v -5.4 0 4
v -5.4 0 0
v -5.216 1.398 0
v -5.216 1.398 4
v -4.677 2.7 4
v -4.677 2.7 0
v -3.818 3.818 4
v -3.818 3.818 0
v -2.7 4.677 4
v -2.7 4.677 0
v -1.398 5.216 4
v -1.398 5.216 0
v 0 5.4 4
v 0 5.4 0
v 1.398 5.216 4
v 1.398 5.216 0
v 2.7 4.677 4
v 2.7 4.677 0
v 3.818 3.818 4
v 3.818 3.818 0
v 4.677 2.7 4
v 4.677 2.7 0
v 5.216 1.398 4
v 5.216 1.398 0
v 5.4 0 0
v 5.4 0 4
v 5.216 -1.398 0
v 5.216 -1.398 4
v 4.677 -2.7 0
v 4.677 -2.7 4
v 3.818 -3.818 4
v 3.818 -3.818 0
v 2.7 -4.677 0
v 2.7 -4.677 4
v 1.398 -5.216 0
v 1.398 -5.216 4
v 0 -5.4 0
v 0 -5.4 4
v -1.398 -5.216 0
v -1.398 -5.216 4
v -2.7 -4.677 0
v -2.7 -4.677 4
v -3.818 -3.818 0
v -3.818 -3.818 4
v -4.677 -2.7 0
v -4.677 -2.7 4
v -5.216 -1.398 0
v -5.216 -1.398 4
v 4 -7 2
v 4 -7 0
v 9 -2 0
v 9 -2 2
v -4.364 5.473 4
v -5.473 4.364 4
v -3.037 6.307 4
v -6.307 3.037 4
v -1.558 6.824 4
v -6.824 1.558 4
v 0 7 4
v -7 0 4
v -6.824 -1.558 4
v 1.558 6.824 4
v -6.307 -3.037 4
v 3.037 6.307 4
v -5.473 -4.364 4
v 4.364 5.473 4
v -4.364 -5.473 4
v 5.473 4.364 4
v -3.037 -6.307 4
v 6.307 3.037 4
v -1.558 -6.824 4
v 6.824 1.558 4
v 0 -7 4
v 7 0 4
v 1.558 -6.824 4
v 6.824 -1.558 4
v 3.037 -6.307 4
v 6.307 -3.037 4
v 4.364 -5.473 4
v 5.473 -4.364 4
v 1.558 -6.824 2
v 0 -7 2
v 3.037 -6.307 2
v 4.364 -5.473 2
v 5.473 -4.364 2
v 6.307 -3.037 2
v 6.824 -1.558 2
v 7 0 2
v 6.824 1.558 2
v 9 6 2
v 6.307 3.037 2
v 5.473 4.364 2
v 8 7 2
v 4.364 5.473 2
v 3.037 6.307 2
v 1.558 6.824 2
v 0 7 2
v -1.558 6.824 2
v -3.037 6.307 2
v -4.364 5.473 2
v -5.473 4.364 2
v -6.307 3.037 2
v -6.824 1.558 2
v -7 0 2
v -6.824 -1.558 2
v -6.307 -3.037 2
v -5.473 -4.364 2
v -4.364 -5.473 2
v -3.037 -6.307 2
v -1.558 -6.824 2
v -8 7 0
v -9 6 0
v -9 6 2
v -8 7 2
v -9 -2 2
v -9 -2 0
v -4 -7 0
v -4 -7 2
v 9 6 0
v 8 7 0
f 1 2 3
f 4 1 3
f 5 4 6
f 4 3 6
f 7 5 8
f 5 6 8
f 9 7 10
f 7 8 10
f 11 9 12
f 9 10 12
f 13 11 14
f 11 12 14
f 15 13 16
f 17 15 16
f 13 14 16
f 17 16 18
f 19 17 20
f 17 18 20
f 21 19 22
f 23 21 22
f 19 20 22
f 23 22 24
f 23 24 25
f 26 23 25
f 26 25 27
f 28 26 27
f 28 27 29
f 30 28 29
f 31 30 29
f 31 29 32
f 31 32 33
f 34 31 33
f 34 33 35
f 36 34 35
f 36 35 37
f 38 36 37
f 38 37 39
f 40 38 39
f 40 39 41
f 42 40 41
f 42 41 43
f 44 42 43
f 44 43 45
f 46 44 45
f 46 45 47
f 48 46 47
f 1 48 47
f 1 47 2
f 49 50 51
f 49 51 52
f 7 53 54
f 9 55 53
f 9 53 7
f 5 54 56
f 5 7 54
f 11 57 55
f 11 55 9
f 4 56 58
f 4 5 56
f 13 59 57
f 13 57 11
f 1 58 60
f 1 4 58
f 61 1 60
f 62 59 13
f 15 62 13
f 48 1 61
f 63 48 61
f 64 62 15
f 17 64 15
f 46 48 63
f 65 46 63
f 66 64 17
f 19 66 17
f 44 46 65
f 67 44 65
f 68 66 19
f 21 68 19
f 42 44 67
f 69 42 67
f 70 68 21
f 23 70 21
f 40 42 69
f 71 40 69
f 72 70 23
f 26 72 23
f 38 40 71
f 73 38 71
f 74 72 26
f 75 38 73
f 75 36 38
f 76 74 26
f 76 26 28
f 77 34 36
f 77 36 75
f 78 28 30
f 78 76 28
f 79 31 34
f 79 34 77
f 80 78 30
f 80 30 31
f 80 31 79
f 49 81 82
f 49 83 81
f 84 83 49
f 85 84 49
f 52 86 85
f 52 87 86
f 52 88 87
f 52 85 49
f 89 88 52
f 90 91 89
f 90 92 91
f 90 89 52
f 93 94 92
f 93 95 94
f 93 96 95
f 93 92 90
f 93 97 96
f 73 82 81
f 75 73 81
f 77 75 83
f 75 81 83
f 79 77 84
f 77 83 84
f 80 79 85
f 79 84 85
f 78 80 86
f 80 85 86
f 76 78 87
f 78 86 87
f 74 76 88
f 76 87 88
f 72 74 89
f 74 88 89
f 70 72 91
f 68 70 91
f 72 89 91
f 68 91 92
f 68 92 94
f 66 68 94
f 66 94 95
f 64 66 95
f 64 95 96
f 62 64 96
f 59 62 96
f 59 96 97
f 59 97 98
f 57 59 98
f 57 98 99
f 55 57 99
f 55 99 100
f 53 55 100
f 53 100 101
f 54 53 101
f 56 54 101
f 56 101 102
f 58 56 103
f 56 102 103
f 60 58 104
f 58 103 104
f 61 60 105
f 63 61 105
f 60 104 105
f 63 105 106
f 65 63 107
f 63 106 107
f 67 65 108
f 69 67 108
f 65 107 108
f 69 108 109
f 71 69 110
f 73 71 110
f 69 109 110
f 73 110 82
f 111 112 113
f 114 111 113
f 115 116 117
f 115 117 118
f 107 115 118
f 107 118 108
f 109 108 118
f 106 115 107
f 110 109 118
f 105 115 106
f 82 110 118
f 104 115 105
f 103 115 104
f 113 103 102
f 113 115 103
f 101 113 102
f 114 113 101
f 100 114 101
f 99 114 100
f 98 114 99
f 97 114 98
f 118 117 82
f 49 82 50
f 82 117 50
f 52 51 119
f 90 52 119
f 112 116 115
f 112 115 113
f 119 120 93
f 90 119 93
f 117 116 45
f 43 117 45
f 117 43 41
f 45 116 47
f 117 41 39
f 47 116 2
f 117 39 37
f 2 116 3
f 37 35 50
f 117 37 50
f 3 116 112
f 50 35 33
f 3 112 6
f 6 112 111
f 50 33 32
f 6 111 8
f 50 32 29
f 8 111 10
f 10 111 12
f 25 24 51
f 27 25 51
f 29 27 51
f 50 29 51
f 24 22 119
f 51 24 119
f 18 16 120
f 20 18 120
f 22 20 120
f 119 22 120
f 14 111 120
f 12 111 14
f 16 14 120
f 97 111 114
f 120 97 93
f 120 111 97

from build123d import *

# Parameters (mm, degrees)
SKETCH1_W                   = 18
SKETCH1_H                   = 14
BOSS_EXTRUDE1_DEPTH         = 2
SKETCH2_R                   = 7
BOSS_EXTRUDE2_DEPTH         = 2
M12X1_25_TAPPED_HOLE1_D     = 10.8
M12X1_25_TAPPED_HOLE1_DEPTH = 8.75
M12X1_25_TAPPED_HOLE1_TIP   = 3.244647343
CHAMFER6_SIZE               = 5
CHAMFER7_SIZE               = 1


with BuildPart() as part:
    # Sketch1 → Boss-Extrude1 (new body)
    with BuildSketch(Plane.XY):
        Rectangle(SKETCH1_W, SKETCH1_H)
    extrude(amount=BOSS_EXTRUDE1_DEPTH)

    # Sketch2 → Boss-Extrude2 (add)
    with BuildSketch(Plane.XY.offset(2)):
        with Locations(Location((0, 0, 0), (0, 0, 270))):
            Circle(SKETCH2_R)
    extrude(amount=BOSS_EXTRUDE2_DEPTH)

    # M12x1.25 Tapped Hole1
    with Locations(Plane.XY.offset(4)):
        with Locations((0, 0)):
            Hole(M12X1_25_TAPPED_HOLE1_D / 2, depth=M12X1_25_TAPPED_HOLE1_DEPTH)
            with Locations((0, 0, -(M12X1_25_TAPPED_HOLE1_DEPTH + M12X1_25_TAPPED_HOLE1_TIP / 2))):  # 118° drill point
                Cone(0, M12X1_25_TAPPED_HOLE1_D / 2, M12X1_25_TAPPED_HOLE1_TIP, mode=Mode.SUBTRACT)

    # Chamfer6
    chamfer6_edges = [part.edges().sort_by_distance(p)[0] for p in [
        (9, -7, 1),
        (-9, -7, 1),
    ]]
    chamfer(chamfer6_edges, length=CHAMFER6_SIZE)

    # Chamfer7
    chamfer7_edges = [part.edges().sort_by_distance(p)[0] for p in [
        (-9, 7, 1),
        (9, 7, 1),
    ]]
    chamfer(chamfer7_edges, length=CHAMFER7_SIZE)


solid = part.part
